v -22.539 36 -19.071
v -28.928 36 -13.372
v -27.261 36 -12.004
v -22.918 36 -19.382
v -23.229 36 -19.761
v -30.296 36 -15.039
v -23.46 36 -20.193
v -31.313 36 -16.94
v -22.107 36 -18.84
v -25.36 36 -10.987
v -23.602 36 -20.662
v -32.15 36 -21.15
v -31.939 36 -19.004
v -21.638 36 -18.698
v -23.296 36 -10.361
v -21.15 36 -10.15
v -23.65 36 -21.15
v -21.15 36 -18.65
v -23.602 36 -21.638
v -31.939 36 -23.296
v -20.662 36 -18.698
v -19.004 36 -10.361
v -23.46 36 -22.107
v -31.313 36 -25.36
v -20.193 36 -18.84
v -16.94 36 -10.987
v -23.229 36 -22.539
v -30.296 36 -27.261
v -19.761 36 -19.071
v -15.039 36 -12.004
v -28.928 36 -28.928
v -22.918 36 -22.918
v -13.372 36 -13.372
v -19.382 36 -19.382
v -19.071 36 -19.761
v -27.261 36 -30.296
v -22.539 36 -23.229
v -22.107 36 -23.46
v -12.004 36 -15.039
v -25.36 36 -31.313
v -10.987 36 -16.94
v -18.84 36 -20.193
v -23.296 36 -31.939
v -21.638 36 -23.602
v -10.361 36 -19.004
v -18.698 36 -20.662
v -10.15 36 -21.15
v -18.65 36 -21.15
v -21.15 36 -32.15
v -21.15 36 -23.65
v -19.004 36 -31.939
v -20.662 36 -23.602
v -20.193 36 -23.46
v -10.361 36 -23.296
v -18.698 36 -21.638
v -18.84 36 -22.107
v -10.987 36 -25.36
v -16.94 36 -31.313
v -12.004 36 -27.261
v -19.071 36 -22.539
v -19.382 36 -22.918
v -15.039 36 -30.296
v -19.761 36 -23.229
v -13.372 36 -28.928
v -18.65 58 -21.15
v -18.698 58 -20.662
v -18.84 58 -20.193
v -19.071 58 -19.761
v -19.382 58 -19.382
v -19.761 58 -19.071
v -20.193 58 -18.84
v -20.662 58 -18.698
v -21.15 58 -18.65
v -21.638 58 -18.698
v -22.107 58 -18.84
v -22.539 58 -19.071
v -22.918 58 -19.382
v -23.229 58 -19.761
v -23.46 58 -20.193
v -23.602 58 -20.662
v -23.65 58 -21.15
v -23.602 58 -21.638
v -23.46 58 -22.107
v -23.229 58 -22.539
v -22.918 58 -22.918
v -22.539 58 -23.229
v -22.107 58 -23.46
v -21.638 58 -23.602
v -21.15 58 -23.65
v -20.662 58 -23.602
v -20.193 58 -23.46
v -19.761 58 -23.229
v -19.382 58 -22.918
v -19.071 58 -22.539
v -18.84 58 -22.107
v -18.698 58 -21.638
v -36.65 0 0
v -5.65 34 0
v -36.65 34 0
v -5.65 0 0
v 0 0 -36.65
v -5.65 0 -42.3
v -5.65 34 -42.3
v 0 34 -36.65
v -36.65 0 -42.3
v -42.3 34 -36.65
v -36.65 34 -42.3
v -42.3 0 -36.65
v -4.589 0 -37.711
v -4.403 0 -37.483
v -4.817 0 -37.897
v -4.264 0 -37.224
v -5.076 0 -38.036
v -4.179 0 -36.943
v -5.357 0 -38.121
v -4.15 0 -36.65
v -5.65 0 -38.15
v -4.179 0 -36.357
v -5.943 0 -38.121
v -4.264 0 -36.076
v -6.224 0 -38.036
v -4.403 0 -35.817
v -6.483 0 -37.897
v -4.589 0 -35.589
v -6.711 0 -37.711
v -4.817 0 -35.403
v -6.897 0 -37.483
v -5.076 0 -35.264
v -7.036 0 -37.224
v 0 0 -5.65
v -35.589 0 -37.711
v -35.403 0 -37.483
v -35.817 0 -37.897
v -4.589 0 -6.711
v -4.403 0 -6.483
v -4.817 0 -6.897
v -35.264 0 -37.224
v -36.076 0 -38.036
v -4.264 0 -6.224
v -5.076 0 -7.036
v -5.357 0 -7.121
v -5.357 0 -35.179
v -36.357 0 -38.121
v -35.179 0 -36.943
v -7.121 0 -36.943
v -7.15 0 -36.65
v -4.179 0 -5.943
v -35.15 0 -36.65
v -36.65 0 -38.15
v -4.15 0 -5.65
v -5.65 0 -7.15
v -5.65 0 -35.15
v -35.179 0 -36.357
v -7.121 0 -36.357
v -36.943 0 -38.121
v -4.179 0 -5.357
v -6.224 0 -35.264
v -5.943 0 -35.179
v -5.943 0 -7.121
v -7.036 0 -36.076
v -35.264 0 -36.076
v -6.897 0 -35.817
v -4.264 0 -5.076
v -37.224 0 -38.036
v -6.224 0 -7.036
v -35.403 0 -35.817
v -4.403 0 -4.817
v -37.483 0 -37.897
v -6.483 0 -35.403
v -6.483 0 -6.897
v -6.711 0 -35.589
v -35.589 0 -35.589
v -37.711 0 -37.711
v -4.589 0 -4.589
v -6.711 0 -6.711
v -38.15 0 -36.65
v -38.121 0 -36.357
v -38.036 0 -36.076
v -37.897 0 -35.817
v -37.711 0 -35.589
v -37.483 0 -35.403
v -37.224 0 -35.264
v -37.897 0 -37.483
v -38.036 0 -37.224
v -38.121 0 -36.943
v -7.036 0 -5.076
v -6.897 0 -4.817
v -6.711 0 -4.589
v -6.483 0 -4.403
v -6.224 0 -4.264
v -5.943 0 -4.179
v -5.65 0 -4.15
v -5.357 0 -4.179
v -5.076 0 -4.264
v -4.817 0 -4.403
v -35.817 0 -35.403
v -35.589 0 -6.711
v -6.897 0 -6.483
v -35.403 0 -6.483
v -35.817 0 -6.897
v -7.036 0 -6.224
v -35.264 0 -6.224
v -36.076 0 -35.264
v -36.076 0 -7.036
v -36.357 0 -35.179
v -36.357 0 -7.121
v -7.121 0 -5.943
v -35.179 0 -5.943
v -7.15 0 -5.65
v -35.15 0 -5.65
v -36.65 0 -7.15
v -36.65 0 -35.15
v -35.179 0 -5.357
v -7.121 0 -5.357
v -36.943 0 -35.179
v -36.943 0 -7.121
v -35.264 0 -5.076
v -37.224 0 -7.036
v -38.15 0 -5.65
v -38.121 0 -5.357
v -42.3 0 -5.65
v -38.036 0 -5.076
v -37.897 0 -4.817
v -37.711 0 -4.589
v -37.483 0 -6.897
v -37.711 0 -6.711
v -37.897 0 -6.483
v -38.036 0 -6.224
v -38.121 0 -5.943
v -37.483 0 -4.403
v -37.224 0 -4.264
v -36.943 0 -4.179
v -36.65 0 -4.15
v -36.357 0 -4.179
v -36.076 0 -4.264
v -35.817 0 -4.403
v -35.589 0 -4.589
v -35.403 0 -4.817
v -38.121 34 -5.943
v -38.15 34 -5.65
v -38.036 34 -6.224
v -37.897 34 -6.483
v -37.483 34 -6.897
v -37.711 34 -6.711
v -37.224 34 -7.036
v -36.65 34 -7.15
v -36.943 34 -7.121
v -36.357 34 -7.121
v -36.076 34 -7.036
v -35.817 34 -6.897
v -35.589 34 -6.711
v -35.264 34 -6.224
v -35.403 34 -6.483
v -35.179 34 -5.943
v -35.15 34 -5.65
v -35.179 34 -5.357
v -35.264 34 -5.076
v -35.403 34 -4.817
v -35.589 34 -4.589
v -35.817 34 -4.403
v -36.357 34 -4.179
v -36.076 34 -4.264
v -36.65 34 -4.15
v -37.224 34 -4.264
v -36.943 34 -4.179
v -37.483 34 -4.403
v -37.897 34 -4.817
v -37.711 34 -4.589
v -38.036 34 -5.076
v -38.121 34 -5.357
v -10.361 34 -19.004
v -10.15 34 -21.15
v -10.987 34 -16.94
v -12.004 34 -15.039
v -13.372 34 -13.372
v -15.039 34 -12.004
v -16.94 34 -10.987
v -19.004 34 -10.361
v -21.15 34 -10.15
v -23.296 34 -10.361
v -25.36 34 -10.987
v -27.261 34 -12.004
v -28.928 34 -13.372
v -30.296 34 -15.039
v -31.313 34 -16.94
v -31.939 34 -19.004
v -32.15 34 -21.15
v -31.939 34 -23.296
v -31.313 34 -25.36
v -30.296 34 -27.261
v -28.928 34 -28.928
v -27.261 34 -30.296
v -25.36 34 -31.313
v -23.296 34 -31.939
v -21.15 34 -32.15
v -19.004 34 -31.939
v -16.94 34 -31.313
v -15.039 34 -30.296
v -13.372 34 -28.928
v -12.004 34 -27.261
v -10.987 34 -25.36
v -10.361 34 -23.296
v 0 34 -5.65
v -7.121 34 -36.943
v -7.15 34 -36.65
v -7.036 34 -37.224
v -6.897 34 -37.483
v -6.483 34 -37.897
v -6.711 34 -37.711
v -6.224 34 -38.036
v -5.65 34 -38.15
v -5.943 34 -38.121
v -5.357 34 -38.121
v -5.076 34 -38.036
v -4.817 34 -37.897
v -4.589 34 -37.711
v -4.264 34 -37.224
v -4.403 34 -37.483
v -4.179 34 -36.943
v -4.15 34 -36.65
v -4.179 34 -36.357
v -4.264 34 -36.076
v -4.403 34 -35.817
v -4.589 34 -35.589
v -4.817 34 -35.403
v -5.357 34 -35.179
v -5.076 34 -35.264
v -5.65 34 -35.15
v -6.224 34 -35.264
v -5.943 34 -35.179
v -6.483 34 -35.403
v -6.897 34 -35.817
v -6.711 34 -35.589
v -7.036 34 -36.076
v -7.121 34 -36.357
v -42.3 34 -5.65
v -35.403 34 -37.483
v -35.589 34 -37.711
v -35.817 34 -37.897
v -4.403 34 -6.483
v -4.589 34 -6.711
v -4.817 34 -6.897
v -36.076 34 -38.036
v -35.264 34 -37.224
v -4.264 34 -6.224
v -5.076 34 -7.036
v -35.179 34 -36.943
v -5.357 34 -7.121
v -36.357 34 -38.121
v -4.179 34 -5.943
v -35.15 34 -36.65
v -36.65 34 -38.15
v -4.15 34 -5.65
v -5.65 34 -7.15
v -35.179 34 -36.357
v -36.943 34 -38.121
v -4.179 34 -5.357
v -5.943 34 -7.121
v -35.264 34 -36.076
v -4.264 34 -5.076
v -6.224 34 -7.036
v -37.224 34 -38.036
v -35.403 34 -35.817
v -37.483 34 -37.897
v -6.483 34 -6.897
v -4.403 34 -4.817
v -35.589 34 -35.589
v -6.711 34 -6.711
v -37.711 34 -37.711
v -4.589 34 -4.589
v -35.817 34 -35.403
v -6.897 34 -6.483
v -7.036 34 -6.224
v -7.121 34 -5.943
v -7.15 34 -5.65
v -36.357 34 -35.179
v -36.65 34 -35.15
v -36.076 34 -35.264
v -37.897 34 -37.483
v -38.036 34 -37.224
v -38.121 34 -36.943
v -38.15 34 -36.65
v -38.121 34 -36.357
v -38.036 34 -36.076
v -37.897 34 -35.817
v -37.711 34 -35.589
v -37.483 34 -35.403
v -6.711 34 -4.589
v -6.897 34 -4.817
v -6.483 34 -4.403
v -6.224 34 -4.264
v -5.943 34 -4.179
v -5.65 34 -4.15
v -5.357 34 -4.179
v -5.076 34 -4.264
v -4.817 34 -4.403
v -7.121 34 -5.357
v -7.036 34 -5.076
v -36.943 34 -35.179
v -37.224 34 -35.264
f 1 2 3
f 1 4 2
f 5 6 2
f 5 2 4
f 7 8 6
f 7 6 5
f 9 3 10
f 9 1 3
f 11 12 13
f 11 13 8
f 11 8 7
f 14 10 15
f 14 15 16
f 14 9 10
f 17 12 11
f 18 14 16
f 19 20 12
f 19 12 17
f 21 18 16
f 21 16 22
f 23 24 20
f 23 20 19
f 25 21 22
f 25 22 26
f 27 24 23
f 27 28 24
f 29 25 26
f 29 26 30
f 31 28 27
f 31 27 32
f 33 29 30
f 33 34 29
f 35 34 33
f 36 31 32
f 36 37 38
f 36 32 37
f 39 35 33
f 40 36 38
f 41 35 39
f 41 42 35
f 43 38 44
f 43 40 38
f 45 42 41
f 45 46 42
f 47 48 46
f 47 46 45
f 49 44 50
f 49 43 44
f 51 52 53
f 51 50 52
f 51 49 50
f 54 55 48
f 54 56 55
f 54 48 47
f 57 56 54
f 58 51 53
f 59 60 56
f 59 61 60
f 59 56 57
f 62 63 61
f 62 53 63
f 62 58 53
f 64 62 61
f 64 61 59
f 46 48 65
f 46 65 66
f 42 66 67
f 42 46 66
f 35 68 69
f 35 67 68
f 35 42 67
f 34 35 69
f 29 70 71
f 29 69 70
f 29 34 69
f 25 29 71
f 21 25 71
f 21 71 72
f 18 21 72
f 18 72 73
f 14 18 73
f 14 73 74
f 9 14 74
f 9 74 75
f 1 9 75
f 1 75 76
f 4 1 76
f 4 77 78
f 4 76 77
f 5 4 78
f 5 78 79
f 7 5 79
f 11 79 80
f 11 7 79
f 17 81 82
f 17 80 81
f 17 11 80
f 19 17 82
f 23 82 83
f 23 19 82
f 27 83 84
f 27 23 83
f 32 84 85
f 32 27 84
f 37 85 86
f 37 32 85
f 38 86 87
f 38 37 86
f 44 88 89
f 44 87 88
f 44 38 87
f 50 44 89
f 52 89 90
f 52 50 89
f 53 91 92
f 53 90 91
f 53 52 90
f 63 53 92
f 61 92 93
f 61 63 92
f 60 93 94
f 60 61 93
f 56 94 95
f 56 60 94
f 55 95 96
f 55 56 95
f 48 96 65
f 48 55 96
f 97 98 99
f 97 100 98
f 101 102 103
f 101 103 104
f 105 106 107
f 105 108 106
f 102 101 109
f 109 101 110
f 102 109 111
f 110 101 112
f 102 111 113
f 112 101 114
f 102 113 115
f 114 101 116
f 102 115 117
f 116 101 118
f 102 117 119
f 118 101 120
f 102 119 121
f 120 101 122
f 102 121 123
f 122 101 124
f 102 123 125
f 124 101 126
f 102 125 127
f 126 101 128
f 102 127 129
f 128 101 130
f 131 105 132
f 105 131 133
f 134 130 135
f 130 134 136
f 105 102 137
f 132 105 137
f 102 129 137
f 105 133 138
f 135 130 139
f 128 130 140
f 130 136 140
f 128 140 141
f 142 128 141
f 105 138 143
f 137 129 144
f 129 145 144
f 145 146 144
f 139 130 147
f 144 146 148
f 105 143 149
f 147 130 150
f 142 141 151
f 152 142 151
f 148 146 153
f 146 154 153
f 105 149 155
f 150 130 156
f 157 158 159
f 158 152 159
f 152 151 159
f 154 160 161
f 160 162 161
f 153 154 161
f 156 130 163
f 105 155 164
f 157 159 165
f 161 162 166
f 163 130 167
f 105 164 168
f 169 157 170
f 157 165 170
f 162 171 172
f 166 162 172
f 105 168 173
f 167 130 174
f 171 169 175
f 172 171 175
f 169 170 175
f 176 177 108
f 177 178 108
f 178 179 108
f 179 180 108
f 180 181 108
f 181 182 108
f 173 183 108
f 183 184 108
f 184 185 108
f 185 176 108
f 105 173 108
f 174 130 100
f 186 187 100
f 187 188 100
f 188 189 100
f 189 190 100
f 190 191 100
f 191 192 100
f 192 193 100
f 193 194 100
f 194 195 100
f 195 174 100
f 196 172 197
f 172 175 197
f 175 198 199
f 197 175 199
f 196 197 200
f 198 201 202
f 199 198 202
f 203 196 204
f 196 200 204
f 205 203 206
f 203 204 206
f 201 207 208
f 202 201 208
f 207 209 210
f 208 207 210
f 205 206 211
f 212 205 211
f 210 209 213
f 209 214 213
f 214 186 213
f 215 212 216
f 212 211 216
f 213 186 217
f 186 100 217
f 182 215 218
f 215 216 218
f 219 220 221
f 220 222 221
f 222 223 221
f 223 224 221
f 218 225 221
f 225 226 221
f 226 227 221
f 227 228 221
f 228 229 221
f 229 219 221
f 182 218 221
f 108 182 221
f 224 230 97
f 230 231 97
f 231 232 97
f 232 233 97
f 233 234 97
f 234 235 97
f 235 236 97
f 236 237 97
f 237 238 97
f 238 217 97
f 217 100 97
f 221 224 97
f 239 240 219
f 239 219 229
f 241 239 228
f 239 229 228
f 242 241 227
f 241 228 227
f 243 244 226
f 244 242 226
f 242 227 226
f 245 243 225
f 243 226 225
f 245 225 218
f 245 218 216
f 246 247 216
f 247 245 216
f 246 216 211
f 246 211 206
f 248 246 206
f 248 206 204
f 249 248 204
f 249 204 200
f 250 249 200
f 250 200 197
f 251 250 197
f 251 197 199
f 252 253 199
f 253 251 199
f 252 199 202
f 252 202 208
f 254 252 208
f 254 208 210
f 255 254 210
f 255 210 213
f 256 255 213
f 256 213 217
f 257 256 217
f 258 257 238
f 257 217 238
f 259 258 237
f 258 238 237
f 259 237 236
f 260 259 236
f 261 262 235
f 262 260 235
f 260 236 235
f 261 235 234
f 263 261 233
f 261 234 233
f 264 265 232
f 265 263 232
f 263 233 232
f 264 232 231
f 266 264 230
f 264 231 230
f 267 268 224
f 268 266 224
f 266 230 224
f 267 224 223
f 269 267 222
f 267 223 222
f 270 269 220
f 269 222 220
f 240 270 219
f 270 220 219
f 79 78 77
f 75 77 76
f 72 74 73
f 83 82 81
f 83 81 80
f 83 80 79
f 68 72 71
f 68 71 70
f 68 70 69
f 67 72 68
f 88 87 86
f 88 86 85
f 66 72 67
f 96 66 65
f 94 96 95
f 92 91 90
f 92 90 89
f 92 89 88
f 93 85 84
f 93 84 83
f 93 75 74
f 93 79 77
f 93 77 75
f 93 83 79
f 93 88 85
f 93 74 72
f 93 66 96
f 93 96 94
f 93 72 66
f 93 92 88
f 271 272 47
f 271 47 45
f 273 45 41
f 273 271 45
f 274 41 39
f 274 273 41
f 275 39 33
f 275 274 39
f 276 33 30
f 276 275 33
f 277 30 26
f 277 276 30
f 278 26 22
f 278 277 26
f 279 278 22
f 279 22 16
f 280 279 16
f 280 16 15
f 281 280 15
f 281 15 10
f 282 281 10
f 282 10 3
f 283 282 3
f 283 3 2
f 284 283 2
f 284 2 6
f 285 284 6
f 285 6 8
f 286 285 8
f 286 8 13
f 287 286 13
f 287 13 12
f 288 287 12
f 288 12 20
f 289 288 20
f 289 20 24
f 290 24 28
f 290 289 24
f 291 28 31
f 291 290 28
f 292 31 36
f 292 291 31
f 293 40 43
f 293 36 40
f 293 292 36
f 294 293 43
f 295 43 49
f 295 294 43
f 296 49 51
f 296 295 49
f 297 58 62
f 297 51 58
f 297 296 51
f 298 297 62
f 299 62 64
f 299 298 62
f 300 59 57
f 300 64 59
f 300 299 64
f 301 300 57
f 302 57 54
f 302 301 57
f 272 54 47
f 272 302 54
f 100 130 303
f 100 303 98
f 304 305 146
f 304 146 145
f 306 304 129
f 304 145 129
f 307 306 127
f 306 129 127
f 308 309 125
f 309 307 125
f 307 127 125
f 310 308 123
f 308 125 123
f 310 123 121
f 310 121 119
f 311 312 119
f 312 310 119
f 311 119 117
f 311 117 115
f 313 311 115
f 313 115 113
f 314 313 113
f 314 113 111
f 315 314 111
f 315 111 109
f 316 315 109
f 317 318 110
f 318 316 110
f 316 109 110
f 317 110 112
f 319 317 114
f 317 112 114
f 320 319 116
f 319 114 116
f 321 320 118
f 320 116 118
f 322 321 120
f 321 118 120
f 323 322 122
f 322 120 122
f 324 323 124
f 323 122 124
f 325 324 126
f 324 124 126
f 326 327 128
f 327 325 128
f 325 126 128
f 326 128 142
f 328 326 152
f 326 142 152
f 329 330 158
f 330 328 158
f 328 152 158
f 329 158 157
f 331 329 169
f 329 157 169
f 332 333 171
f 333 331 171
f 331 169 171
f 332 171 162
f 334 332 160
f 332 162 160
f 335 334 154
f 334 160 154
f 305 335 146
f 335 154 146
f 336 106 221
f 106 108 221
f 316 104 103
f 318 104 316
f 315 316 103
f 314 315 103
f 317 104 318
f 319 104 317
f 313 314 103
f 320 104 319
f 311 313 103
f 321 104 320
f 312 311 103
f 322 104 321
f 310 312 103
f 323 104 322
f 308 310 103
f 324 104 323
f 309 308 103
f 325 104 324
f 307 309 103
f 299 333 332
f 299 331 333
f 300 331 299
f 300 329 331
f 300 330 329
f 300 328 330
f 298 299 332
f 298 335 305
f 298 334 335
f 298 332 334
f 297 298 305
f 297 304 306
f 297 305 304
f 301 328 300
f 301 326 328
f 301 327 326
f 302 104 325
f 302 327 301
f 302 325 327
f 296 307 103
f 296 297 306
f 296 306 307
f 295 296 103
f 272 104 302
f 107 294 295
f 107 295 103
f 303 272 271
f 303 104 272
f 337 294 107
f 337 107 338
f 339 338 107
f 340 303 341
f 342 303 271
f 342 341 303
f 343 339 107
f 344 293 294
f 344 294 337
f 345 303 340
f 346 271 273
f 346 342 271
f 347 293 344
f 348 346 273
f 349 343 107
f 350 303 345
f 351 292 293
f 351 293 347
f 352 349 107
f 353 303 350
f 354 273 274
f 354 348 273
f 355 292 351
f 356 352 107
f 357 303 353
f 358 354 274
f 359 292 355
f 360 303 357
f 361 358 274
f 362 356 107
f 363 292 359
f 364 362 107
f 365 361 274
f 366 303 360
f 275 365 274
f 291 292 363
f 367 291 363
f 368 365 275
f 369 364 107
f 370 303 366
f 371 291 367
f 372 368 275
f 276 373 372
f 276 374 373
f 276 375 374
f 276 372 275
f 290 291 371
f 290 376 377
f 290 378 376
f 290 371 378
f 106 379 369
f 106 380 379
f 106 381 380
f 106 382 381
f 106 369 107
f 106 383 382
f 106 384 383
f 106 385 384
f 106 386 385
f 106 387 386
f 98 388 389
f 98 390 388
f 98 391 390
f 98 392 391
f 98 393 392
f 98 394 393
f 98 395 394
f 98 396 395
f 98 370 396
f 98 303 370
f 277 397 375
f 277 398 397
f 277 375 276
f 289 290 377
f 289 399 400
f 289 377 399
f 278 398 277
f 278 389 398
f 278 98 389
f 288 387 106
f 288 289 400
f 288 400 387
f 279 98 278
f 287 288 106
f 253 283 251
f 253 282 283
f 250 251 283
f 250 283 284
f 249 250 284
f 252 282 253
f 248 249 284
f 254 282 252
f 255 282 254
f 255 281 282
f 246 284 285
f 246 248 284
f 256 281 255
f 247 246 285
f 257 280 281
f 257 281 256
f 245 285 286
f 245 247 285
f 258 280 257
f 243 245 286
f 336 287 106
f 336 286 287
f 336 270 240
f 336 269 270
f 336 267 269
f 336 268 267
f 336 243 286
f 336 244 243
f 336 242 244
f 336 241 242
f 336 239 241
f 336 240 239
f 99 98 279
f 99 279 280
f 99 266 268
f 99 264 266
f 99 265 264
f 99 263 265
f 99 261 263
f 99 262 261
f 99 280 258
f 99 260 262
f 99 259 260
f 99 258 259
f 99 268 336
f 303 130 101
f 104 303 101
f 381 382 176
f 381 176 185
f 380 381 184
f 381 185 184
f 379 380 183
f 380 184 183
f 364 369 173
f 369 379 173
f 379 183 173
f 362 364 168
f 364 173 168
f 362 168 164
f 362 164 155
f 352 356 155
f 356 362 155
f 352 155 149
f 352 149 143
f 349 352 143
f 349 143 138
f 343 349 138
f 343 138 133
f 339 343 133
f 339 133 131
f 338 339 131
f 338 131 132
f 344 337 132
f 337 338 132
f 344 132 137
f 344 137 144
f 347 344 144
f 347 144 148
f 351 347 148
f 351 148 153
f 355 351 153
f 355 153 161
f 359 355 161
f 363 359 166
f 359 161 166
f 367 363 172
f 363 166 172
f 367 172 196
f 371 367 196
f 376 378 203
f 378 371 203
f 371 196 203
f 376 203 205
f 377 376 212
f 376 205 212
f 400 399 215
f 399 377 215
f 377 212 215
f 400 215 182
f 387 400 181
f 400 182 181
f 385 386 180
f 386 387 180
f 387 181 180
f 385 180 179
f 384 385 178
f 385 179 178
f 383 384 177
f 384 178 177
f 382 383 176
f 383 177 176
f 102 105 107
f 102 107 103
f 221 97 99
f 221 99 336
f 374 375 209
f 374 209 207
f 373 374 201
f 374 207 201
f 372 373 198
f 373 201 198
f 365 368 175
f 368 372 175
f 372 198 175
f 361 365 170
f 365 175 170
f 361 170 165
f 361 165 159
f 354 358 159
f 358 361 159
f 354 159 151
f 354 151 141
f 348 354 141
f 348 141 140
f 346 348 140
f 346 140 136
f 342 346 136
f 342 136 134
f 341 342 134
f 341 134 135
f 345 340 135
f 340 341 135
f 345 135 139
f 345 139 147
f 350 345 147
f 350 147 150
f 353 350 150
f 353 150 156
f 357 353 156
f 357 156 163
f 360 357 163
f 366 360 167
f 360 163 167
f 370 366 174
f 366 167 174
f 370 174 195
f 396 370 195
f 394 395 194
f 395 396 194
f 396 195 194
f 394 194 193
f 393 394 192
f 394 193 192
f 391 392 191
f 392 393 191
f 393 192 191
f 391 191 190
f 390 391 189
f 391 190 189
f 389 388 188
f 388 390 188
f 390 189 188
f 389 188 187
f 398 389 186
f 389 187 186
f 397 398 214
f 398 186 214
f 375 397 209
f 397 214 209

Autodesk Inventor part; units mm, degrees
ref_plane "YZ Plane" through (0, 0, 0) normal (1, 0, 0) x (0, 1, 0)
ref_plane "XZ Plane" through (0, 0, 0) normal (0, 1, 0) x (-1, 0, 0)
ref_plane "XY Plane" through (0, 0, 0) normal (0, 0, 1) x (1, 0, 0)
sketch "Sketch1" plane through (0, 0, 0) normal (0, 1, 0) x (-1, 0, 0)
  line L0 (0, -5.65) -> (0, -36.65)
  line L1 (36.65, -42.3) -> (5.65, -42.3)
  line L2 (42.3, -36.65) -> (42.3, -5.65)
  line L3 (5.65, 0) -> (36.65, 0)
  line L4 (36.65, 0) -> (42.3, -5.65)
  line L5 (42.3, -36.65) -> (36.65, -42.3)
  line L6 (5.65, -42.3) -> (0, -36.65)
  line L7 (0, -5.65) -> (5.65, 0)
  line L8 (5.65, -36.65) -> (36.65, -36.65) construction
  line L9 (36.65, -36.65) -> (36.65, -5.65) construction
  line L10 (36.65, -5.65) -> (5.65, -5.65) construction
  line L11 (5.65, -5.65) -> (5.65, -36.65) construction
  line L12 (5.65, -36.65) -> (36.65, -5.65) construction
  line L13 (36.65, -36.65) -> (5.65, -5.65) construction
  circle A0 centre (36.65, -5.65) radius 1.5
  circle A1 centre (36.65, -36.65) radius 1.5
  circle A2 centre (5.65, -36.65) radius 1.5
  circle A3 centre (5.65, -5.65) radius 1.5
  point P0 (0, 0)
  point P1 (21.15, -21.15)
  dimension "d12" = 3
  dimension "d14" = 3
  dimension "d15" = 3
extrude "Extrusion1" add sketch "Sketch1" along normal blind 34
sketch "Sketch2" plane through (0, 34, 0) normal (0, 1, 0) x (1, 0, 0)
  line L0 (-42.3, 5.65) -> (-36.65, 0) construction
  line L1 (-39.475, 2.825) -> (-2.825, 39.475) construction
  line L2 (0, 36.65) -> (-5.65, 42.3) construction
  line L3 (-36.65, 42.3) -> (-42.3, 36.65) construction
  line L4 (-39.475, 39.475) -> (-2.825, 2.825) construction
  line L5 (-5.65, 0) -> (0, 5.65) construction
  circle A0 centre (-21.15, 21.15) radius 11
  point P0 (0, 0)
  dimension "d18" = 22
extrude "Extrusion2" add sketch "Sketch2" along normal blind 2
sketch "Sketch3" plane through (-21.15, 36, -21.15) normal (0, 1, 0) x (1, 0, 0)
  line L0 (-21.15, -15.5) -> (-15.5, -21.15) construction
  line L1 (-18.325, -18.325) -> (18.325, 18.325) construction
  line L2 (21.15, 15.5) -> (15.5, 21.15) construction
  line L3 (-18.325, 18.325) -> (18.325, -18.325) construction
  line L4 (15.5, -21.15) -> (21.15, -15.5) construction
  circle A0 centre (0, 0) radius 2.5
  point P0 (21.15, -21.15)
  dimension "d21" = 5
extrude "Extrusion3" add sketch "Sketch3" along normal blind 22
properties part number "NEMA16 Motor" material "Steel"
